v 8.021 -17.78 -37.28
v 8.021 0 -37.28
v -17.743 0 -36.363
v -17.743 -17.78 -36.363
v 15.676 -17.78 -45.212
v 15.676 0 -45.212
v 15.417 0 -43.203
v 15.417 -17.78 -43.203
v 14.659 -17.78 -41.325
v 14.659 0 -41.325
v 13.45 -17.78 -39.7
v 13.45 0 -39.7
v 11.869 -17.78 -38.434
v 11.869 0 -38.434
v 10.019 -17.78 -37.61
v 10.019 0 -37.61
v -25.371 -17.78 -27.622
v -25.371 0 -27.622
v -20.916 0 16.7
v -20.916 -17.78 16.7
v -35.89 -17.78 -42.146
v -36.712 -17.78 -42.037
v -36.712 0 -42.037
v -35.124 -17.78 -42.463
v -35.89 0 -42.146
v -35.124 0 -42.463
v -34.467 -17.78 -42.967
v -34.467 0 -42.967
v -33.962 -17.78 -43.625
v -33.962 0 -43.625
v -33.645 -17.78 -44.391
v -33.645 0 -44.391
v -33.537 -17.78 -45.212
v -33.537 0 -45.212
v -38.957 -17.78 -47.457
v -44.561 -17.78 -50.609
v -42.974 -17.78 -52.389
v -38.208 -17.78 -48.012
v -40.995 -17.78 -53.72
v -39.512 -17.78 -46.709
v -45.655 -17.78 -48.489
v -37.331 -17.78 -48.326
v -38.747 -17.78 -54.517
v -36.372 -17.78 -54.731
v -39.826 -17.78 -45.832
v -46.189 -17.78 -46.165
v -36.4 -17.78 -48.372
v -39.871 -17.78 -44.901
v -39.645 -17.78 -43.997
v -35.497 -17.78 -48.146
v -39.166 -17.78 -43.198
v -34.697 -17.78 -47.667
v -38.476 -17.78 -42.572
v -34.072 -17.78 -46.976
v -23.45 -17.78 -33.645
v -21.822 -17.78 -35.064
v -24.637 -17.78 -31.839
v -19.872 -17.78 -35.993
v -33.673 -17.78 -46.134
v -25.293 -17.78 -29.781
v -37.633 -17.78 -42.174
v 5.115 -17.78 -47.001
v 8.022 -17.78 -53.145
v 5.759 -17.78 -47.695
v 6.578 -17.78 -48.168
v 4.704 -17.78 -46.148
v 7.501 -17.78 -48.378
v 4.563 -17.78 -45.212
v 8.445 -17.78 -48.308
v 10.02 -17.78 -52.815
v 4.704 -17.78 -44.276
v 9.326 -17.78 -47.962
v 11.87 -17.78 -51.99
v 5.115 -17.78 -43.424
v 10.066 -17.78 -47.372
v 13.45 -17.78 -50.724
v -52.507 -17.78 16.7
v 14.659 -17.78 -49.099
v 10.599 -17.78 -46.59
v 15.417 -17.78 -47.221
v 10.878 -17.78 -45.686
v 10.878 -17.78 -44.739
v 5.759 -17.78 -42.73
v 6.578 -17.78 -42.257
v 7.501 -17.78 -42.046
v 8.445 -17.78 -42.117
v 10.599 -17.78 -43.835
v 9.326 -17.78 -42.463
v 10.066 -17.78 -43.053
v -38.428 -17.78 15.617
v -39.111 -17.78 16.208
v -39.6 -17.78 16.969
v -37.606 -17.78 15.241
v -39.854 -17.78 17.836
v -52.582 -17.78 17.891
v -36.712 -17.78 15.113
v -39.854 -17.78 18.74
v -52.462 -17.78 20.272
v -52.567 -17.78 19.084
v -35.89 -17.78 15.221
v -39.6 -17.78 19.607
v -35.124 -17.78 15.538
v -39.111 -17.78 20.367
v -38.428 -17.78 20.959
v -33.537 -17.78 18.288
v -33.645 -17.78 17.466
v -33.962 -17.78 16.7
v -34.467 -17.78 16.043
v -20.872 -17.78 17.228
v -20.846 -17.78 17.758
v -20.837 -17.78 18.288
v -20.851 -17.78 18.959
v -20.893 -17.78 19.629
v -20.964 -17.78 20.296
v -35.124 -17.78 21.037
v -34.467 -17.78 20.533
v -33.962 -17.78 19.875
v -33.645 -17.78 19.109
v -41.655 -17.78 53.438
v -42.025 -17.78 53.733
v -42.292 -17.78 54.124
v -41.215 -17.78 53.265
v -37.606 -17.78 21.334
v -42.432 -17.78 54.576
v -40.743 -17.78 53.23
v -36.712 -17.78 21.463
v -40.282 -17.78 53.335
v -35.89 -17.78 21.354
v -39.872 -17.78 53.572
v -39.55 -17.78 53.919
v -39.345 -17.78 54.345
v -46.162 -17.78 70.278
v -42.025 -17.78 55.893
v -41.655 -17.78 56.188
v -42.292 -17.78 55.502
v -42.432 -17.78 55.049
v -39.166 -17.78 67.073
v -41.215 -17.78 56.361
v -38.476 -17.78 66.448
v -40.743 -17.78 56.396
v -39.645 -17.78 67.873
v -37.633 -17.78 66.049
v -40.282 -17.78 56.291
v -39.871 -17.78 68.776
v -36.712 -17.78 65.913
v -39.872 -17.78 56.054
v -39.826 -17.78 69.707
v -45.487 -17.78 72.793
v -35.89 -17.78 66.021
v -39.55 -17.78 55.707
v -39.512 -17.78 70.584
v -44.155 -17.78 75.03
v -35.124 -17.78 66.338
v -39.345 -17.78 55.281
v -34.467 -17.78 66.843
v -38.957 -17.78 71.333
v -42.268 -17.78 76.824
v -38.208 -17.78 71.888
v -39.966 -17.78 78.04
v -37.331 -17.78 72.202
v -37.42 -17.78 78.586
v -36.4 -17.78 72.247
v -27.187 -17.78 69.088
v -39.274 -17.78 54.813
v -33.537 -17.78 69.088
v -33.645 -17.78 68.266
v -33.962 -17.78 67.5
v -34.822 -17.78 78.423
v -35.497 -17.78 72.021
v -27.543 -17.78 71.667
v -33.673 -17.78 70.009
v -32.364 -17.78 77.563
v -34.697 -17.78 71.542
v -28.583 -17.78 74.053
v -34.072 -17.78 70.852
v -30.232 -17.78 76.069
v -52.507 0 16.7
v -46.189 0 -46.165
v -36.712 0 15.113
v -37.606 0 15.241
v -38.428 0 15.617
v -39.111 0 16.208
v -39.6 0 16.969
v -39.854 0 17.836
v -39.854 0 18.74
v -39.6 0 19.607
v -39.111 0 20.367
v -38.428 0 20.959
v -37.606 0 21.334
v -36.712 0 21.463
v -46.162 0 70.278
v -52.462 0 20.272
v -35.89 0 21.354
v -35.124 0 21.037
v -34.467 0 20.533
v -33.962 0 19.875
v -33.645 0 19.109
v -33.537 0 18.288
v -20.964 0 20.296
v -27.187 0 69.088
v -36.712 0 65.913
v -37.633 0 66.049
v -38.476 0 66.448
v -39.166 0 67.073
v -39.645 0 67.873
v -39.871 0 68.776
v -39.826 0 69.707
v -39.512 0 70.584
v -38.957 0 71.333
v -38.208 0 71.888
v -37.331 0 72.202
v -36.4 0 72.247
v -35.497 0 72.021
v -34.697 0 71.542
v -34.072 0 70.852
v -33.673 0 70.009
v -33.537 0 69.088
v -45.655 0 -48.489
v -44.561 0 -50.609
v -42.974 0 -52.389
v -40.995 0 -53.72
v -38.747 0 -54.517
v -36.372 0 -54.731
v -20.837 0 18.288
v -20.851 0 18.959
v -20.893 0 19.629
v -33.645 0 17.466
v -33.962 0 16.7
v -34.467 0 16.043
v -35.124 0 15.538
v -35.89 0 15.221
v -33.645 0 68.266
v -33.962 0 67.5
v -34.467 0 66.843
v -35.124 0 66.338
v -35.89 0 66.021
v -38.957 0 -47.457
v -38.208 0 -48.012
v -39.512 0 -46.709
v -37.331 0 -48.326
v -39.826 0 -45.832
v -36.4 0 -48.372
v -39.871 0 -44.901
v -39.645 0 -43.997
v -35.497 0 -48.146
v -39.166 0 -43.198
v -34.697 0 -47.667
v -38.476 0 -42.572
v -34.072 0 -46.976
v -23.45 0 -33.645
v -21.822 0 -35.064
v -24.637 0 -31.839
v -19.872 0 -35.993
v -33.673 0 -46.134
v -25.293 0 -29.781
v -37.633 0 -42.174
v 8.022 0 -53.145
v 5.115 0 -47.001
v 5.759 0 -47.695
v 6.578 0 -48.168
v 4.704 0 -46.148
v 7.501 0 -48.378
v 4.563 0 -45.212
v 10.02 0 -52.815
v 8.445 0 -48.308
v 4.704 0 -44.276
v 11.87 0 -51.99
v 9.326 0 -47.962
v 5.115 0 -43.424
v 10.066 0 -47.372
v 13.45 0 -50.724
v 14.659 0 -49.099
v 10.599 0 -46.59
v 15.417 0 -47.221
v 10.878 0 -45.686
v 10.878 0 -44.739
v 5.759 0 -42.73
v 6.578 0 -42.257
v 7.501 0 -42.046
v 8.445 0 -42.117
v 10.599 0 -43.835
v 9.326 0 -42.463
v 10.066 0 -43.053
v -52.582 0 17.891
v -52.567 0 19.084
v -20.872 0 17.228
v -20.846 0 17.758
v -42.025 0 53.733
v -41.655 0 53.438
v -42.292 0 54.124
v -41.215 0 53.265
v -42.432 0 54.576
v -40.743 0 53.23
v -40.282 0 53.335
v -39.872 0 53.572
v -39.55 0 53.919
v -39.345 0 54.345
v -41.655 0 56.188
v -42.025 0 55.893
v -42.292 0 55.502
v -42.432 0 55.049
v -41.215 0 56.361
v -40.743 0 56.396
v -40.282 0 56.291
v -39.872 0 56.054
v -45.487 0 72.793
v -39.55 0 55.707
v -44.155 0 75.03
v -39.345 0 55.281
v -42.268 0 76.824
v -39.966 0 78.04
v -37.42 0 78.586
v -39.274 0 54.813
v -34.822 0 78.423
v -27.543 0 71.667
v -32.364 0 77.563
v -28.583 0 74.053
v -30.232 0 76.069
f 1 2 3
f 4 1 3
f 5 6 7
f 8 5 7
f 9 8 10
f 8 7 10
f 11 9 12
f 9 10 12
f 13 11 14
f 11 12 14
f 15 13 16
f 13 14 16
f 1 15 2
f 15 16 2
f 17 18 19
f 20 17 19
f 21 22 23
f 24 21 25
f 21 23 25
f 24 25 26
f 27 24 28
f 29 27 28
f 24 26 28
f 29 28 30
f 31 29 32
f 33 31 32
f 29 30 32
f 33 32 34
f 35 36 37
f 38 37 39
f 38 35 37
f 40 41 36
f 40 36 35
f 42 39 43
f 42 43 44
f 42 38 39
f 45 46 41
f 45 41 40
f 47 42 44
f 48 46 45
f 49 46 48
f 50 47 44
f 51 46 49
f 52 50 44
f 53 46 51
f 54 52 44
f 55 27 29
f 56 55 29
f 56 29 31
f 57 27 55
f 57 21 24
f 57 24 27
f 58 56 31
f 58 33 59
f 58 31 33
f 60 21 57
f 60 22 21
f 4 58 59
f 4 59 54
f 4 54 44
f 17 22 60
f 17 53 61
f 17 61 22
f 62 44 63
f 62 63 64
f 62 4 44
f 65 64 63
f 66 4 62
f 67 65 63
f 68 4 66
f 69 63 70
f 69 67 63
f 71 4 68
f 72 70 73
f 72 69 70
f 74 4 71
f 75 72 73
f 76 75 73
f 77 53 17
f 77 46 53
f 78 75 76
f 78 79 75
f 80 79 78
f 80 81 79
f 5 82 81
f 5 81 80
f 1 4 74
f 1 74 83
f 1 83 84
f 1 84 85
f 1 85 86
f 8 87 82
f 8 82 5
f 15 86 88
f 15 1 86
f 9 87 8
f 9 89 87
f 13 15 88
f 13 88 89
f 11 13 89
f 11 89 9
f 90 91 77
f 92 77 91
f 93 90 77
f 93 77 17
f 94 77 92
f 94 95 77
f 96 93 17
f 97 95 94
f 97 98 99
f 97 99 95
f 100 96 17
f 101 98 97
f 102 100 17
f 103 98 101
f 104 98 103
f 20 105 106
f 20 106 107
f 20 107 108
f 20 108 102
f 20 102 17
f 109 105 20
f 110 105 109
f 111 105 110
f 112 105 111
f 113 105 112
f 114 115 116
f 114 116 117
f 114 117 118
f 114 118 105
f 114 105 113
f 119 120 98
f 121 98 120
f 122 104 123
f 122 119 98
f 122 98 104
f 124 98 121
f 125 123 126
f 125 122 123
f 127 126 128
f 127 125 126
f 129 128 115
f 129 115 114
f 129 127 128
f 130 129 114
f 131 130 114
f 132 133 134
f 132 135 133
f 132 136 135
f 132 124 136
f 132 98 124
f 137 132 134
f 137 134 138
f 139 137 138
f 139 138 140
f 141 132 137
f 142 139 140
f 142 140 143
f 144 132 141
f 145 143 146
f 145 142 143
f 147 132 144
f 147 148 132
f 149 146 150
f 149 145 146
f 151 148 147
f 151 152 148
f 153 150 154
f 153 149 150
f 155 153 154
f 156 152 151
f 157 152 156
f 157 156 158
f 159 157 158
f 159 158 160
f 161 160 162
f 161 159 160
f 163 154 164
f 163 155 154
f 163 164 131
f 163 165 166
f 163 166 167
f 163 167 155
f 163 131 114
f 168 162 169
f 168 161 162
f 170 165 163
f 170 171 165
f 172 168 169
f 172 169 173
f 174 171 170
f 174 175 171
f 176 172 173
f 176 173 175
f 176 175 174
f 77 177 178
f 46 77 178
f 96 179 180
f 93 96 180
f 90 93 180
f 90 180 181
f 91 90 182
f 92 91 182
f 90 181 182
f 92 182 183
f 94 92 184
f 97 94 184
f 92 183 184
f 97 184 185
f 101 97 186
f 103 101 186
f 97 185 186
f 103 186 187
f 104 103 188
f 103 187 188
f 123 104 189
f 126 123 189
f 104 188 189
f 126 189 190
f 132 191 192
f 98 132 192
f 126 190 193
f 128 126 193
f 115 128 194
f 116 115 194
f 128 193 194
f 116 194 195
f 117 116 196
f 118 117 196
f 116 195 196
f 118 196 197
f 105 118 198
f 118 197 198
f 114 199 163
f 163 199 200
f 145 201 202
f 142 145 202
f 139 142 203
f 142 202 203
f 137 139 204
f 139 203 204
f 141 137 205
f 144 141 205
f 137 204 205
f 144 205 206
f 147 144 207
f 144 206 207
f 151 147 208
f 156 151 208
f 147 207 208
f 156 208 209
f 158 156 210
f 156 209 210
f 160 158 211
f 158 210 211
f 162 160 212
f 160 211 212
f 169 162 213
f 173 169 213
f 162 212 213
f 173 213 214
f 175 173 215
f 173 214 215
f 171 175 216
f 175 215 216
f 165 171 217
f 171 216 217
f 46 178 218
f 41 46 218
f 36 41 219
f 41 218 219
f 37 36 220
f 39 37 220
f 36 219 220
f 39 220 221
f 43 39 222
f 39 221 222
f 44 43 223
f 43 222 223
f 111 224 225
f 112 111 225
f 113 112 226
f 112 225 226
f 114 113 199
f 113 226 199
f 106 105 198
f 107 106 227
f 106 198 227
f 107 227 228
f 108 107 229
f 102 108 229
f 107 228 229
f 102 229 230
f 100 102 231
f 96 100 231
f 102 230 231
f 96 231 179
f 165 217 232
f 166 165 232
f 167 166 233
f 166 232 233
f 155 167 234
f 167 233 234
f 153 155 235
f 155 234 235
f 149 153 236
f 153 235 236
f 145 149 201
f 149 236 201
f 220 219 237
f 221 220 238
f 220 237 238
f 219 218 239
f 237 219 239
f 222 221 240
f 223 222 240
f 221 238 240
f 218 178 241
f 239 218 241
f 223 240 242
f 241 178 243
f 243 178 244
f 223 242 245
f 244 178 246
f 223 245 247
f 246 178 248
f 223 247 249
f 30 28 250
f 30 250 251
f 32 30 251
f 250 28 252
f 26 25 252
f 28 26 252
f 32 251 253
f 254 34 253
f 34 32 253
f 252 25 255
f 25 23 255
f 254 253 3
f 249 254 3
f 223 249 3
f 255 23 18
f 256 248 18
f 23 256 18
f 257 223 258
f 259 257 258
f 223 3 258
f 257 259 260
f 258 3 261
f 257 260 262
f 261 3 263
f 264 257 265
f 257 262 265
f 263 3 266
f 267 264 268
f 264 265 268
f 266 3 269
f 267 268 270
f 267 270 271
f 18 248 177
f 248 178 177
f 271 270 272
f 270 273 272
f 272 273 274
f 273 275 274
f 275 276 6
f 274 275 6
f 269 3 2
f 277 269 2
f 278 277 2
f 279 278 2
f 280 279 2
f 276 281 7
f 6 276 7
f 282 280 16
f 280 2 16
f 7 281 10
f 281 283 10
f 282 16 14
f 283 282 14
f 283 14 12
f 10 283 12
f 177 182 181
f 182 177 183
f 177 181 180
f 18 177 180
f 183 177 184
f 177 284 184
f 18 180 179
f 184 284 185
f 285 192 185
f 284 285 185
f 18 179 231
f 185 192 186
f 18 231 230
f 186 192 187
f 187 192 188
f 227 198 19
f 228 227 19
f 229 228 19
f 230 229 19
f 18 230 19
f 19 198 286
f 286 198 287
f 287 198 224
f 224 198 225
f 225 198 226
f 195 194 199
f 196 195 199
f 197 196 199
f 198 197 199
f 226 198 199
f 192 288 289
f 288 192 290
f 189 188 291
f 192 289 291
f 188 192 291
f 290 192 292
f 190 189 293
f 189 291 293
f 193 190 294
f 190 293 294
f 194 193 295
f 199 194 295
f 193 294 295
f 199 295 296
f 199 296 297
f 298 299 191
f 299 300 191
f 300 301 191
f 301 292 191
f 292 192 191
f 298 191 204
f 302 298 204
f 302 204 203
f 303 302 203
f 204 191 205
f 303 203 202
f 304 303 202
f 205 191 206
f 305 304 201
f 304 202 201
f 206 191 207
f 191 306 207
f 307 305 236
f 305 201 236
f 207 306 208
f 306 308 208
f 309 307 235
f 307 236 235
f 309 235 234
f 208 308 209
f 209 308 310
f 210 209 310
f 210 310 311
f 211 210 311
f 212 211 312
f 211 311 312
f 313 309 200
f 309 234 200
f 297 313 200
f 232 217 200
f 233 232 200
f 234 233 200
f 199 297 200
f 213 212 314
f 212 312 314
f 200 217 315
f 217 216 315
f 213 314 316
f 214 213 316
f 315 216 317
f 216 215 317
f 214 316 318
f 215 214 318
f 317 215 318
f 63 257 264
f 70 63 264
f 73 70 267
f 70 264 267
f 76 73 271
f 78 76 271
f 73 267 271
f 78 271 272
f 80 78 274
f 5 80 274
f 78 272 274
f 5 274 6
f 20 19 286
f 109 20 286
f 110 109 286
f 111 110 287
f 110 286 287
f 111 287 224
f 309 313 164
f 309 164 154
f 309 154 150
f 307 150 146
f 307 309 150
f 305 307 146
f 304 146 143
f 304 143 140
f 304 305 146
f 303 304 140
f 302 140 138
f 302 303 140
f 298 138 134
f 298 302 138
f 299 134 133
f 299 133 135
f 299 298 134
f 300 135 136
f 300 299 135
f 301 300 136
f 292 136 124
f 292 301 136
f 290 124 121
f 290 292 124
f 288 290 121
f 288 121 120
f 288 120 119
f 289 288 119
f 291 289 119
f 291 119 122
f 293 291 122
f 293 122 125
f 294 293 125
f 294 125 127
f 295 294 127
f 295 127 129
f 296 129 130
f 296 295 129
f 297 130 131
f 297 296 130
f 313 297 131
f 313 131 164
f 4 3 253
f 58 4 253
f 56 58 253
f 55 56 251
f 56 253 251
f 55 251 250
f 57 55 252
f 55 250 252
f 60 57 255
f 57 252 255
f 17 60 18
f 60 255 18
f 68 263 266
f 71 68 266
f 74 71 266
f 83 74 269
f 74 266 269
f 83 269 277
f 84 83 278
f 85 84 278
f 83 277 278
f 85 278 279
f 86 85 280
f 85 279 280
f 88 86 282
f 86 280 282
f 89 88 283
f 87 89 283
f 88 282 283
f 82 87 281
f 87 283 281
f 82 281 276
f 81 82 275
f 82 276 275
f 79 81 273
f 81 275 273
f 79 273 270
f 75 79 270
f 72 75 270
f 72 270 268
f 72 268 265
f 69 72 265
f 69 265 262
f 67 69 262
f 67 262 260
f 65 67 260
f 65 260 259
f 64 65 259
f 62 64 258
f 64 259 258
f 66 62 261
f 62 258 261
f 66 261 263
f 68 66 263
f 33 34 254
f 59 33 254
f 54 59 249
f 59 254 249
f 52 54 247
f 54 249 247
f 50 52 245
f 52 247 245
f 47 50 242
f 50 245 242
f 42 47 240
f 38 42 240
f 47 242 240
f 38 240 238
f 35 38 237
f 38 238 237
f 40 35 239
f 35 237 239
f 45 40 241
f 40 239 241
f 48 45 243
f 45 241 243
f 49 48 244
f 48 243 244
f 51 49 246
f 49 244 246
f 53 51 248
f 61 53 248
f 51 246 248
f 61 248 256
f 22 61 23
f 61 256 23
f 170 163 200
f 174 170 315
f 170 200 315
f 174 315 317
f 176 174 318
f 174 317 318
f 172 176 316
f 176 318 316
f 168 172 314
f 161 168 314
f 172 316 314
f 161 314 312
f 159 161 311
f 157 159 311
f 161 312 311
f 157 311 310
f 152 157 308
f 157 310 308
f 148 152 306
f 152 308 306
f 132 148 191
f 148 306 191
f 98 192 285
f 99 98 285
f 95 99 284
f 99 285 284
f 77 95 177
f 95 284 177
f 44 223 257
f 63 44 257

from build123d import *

# Parameters (mm, degrees)
F0_R     = 1.5875
F1_DEPTH = 17.78


with BuildPart() as f1:
    # F0 (on Front) → F1 (new body)
    with BuildSketch(Plane.XZ):
        with BuildLine():
            ThreePointArc((-46.1619771098, 70.2782855404), (-43.8554341456, 62.7874652309), (-36.7116841456, 59.5626605404))
            ThreePointArc((-36.7116841456, 59.5626605404), (-29.9764920548, 62.3524684496), (-27.1866841456, 69.0876605404))
            ThreePointArc((-27.1866841456, 69.0876605404), (-36.1152009036, 78.5939654346), (-46.1619771098, 70.2782855404))
        make_face()
        with BuildLine():
            ThreePointArc((-33.5366841456, 69.0876605404), (-34.4666201153, 66.8425965101), (-36.7116841456, 65.9126605404))
            ThreePointArc((-36.7116841456, 65.9126605404), (-38.9567481759, 71.3327245707), (-33.5366841456, 69.0876605404))
        make_face(mode=Mode.SUBTRACT)
        with BuildLine():
            Line((-36.7116841456, 34.1626605404), (-36.7116841456, 59.5626605404))
            ThreePointArc((-36.7116841456, 59.5626605404), (-43.8554341456, 62.7874652309), (-46.1619771098, 70.2782855404))
            Line((-46.1619771098, 70.2782855404), (-52.4621724193, 20.2720355404))
            ThreePointArc((-52.4621724193, 20.2720355404), (-47.2120096614, 30.1939105404), (-36.7116841456, 34.1626605404))
        make_face()
        with Locations((-40.8617444336, 54.8128605404)):
            Circle(F0_R, mode=Mode.SUBTRACT)
        with BuildLine():
            ThreePointArc((-27.1866841456, 69.0876605404), (-29.9764920548, 62.3524684496), (-36.7116841456, 59.5626605404))
            Line((-36.7116841456, 59.5626605404), (-36.7116841456, 34.1626605404))
            ThreePointArc((-36.7116841456, 34.1626605404), (-26.2204012908, 30.2018793171), (-20.9642272409, 20.2959498708))
            Line((-20.9642272409, 20.2959498708), (-27.1866841456, 69.0876605404))
        make_face()
        with BuildLine():
            Line((-36.7116841456, 21.4626605404), (-36.7116841456, 34.1626605404))
            ThreePointArc((-36.7116841456, 34.1626605404), (-47.2120096614, 30.1939105404), (-52.4621724193, 20.2720355404))
            ThreePointArc((-52.4621724193, 20.2720355404), (-52.585427961, 18.4873660271), (-52.5071097097, 16.7001605404))
            ThreePointArc((-52.5071097097, 16.7001605404), (-47.3609578884, 6.5144454421), (-36.7116841456, 2.4126605404))
            Line((-36.7116841456, 2.4126605404), (-36.7116841456, 15.1126605404))
            ThreePointArc((-36.7116841456, 15.1126605404), (-39.8866841456, 18.2876605404), (-36.7116841456, 21.4626605404))
        make_face()
        with BuildLine():
            ThreePointArc((-20.9642272409, 20.2959498708), (-26.2204012908, 30.2018793171), (-36.7116841456, 34.1626605404))
            Line((-36.7116841456, 34.1626605404), (-36.7116841456, 21.4626605404))
            ThreePointArc((-36.7116841456, 21.4626605404), (-34.4666201153, 20.5327245707), (-33.5366841456, 18.2876605404))
            ThreePointArc((-33.5366841456, 18.2876605404), (-34.4666201153, 16.0425965101), (-36.7116841456, 15.1126605404))
            Line((-36.7116841456, 15.1126605404), (-36.7116841456, 2.4126605404))
            ThreePointArc((-36.7116841456, 2.4126605404), (-26.0624104027, 6.5144454421), (-20.9162585815, 16.7001605404))
            ThreePointArc((-20.9162585815, 16.7001605404), (-20.856590235, 17.4929139863), (-20.8366841456, 18.2876605404))
            ThreePointArc((-20.8366841456, 18.2876605404), (-20.868602006, 19.29382818), (-20.9642272409, 20.2959498708))
        make_face()
        with BuildLine():
            ThreePointArc((-36.7116841456, 2.4126605404), (-47.3609578884, 6.5144454421), (-52.5071097097, 16.7001605404))
            Line((-52.5071097097, 16.7001605404), (-46.188939484, -46.1648394596))
            ThreePointArc((-46.188939484, -46.1648394596), (-43.7756132045, -38.8227752139), (-36.7116841456, -35.6873394596))
            Line((-36.7116841456, -35.6873394596), (-36.7116841456, 2.4126605404))
        make_face()
        with BuildLine():
            ThreePointArc((-20.9162585815, 16.7001605404), (-26.0624104027, 6.5144454421), (-36.7116841456, 2.4126605404))
            Line((-36.7116841456, 2.4126605404), (-36.7116841456, -35.6873394596))
            ThreePointArc((-36.7116841456, -35.6873394596), (-29.9764920548, -38.4771473688), (-27.1866841456, -45.2123394596))
            Line((-27.1866841456, -45.2123394596), (-0.1991841456, -45.2123394596))
            ThreePointArc((-0.1991841456, -45.2123394596), (2.2264053697, -39.5007066757), (8.020721129, -37.279864845))
            Line((8.020721129, -37.279864845), (-17.7433562776, -36.362633879))
            ThreePointArc((-17.7433562776, -36.362633879), (-23.4504801631, -33.6448765637), (-25.3708482771, -27.622447305))
            Line((-25.3708482771, -27.622447305), (-20.9162585815, 16.7001605404))
        make_face()
        with BuildLine():
            ThreePointArc((-36.7116841456, -35.6873394596), (-43.7756132045, -38.8227752139), (-46.188939484, -46.1648394596))
            ThreePointArc((-46.188939484, -46.1648394596), (-42.9740675272, -52.3892593687), (-36.3715055742, -54.7312629039))
            ThreePointArc((-36.3715055742, -54.7312629039), (-29.8572758599, -51.8261667973), (-27.1866841456, -45.2123394596))
            Line((-27.1866841456, -45.2123394596), (-33.5366841456, -45.2123394596))
            ThreePointArc((-33.5366841456, -45.2123394596), (-38.9567481759, -47.4574034899), (-36.7116841456, -42.0373394596))
            Line((-36.7116841456, -42.0373394596), (-36.7116841456, -35.6873394596))
        make_face()
        with BuildLine():
            ThreePointArc((-27.1866841456, -45.2123394596), (-29.9764920548, -38.4771473688), (-36.7116841456, -35.6873394596))
            Line((-36.7116841456, -35.6873394596), (-36.7116841456, -42.0373394596))
            ThreePointArc((-36.7116841456, -42.0373394596), (-34.4666201153, -42.9672754293), (-33.5366841456, -45.2123394596))
            Line((-33.5366841456, -45.2123394596), (-27.1866841456, -45.2123394596))
        make_face()
        with BuildLine():
            ThreePointArc((-0.1991841456, -45.2123394596), (2.226793073, -50.9243463643), (8.0217979973, -53.1447756632))
            ThreePointArc((8.0217979973, -53.1447756632), (13.4503227591, -50.723862241), (15.6758158544, -45.2123394596))
            ThreePointArc((15.6758158544, -45.2123394596), (13.4499486383, -39.7004289749), (8.020721129, -37.279864845))
            ThreePointArc((8.020721129, -37.279864845), (2.2264053697, -39.5007066757), (-0.1991841456, -45.2123394596))
        make_face()
        with BuildLine():
            ThreePointArc((10.9133158544, -45.2123394596), (7.7383158544, -48.3873394596), (4.5633158544, -45.2123394596))
            ThreePointArc((4.5633158544, -45.2123394596), (7.7383158544, -42.0373394596), (10.9133158544, -45.2123394596))
        make_face(mode=Mode.SUBTRACT)
        with BuildLine():
            ThreePointArc((-27.1866841456, -45.2123394596), (-29.8572758599, -51.8261667973), (-36.3715055742, -54.7312629039))
            Line((-36.3715055742, -54.7312629039), (8.0217979973, -53.1447756632))
            ThreePointArc((8.0217979973, -53.1447756632), (2.226793073, -50.9243463643), (-0.1991841456, -45.2123394596))
            Line((-0.1991841456, -45.2123394596), (-27.1866841456, -45.2123394596))
        make_face()
    extrude(amount=F1_DEPTH)


solid = f1.part
